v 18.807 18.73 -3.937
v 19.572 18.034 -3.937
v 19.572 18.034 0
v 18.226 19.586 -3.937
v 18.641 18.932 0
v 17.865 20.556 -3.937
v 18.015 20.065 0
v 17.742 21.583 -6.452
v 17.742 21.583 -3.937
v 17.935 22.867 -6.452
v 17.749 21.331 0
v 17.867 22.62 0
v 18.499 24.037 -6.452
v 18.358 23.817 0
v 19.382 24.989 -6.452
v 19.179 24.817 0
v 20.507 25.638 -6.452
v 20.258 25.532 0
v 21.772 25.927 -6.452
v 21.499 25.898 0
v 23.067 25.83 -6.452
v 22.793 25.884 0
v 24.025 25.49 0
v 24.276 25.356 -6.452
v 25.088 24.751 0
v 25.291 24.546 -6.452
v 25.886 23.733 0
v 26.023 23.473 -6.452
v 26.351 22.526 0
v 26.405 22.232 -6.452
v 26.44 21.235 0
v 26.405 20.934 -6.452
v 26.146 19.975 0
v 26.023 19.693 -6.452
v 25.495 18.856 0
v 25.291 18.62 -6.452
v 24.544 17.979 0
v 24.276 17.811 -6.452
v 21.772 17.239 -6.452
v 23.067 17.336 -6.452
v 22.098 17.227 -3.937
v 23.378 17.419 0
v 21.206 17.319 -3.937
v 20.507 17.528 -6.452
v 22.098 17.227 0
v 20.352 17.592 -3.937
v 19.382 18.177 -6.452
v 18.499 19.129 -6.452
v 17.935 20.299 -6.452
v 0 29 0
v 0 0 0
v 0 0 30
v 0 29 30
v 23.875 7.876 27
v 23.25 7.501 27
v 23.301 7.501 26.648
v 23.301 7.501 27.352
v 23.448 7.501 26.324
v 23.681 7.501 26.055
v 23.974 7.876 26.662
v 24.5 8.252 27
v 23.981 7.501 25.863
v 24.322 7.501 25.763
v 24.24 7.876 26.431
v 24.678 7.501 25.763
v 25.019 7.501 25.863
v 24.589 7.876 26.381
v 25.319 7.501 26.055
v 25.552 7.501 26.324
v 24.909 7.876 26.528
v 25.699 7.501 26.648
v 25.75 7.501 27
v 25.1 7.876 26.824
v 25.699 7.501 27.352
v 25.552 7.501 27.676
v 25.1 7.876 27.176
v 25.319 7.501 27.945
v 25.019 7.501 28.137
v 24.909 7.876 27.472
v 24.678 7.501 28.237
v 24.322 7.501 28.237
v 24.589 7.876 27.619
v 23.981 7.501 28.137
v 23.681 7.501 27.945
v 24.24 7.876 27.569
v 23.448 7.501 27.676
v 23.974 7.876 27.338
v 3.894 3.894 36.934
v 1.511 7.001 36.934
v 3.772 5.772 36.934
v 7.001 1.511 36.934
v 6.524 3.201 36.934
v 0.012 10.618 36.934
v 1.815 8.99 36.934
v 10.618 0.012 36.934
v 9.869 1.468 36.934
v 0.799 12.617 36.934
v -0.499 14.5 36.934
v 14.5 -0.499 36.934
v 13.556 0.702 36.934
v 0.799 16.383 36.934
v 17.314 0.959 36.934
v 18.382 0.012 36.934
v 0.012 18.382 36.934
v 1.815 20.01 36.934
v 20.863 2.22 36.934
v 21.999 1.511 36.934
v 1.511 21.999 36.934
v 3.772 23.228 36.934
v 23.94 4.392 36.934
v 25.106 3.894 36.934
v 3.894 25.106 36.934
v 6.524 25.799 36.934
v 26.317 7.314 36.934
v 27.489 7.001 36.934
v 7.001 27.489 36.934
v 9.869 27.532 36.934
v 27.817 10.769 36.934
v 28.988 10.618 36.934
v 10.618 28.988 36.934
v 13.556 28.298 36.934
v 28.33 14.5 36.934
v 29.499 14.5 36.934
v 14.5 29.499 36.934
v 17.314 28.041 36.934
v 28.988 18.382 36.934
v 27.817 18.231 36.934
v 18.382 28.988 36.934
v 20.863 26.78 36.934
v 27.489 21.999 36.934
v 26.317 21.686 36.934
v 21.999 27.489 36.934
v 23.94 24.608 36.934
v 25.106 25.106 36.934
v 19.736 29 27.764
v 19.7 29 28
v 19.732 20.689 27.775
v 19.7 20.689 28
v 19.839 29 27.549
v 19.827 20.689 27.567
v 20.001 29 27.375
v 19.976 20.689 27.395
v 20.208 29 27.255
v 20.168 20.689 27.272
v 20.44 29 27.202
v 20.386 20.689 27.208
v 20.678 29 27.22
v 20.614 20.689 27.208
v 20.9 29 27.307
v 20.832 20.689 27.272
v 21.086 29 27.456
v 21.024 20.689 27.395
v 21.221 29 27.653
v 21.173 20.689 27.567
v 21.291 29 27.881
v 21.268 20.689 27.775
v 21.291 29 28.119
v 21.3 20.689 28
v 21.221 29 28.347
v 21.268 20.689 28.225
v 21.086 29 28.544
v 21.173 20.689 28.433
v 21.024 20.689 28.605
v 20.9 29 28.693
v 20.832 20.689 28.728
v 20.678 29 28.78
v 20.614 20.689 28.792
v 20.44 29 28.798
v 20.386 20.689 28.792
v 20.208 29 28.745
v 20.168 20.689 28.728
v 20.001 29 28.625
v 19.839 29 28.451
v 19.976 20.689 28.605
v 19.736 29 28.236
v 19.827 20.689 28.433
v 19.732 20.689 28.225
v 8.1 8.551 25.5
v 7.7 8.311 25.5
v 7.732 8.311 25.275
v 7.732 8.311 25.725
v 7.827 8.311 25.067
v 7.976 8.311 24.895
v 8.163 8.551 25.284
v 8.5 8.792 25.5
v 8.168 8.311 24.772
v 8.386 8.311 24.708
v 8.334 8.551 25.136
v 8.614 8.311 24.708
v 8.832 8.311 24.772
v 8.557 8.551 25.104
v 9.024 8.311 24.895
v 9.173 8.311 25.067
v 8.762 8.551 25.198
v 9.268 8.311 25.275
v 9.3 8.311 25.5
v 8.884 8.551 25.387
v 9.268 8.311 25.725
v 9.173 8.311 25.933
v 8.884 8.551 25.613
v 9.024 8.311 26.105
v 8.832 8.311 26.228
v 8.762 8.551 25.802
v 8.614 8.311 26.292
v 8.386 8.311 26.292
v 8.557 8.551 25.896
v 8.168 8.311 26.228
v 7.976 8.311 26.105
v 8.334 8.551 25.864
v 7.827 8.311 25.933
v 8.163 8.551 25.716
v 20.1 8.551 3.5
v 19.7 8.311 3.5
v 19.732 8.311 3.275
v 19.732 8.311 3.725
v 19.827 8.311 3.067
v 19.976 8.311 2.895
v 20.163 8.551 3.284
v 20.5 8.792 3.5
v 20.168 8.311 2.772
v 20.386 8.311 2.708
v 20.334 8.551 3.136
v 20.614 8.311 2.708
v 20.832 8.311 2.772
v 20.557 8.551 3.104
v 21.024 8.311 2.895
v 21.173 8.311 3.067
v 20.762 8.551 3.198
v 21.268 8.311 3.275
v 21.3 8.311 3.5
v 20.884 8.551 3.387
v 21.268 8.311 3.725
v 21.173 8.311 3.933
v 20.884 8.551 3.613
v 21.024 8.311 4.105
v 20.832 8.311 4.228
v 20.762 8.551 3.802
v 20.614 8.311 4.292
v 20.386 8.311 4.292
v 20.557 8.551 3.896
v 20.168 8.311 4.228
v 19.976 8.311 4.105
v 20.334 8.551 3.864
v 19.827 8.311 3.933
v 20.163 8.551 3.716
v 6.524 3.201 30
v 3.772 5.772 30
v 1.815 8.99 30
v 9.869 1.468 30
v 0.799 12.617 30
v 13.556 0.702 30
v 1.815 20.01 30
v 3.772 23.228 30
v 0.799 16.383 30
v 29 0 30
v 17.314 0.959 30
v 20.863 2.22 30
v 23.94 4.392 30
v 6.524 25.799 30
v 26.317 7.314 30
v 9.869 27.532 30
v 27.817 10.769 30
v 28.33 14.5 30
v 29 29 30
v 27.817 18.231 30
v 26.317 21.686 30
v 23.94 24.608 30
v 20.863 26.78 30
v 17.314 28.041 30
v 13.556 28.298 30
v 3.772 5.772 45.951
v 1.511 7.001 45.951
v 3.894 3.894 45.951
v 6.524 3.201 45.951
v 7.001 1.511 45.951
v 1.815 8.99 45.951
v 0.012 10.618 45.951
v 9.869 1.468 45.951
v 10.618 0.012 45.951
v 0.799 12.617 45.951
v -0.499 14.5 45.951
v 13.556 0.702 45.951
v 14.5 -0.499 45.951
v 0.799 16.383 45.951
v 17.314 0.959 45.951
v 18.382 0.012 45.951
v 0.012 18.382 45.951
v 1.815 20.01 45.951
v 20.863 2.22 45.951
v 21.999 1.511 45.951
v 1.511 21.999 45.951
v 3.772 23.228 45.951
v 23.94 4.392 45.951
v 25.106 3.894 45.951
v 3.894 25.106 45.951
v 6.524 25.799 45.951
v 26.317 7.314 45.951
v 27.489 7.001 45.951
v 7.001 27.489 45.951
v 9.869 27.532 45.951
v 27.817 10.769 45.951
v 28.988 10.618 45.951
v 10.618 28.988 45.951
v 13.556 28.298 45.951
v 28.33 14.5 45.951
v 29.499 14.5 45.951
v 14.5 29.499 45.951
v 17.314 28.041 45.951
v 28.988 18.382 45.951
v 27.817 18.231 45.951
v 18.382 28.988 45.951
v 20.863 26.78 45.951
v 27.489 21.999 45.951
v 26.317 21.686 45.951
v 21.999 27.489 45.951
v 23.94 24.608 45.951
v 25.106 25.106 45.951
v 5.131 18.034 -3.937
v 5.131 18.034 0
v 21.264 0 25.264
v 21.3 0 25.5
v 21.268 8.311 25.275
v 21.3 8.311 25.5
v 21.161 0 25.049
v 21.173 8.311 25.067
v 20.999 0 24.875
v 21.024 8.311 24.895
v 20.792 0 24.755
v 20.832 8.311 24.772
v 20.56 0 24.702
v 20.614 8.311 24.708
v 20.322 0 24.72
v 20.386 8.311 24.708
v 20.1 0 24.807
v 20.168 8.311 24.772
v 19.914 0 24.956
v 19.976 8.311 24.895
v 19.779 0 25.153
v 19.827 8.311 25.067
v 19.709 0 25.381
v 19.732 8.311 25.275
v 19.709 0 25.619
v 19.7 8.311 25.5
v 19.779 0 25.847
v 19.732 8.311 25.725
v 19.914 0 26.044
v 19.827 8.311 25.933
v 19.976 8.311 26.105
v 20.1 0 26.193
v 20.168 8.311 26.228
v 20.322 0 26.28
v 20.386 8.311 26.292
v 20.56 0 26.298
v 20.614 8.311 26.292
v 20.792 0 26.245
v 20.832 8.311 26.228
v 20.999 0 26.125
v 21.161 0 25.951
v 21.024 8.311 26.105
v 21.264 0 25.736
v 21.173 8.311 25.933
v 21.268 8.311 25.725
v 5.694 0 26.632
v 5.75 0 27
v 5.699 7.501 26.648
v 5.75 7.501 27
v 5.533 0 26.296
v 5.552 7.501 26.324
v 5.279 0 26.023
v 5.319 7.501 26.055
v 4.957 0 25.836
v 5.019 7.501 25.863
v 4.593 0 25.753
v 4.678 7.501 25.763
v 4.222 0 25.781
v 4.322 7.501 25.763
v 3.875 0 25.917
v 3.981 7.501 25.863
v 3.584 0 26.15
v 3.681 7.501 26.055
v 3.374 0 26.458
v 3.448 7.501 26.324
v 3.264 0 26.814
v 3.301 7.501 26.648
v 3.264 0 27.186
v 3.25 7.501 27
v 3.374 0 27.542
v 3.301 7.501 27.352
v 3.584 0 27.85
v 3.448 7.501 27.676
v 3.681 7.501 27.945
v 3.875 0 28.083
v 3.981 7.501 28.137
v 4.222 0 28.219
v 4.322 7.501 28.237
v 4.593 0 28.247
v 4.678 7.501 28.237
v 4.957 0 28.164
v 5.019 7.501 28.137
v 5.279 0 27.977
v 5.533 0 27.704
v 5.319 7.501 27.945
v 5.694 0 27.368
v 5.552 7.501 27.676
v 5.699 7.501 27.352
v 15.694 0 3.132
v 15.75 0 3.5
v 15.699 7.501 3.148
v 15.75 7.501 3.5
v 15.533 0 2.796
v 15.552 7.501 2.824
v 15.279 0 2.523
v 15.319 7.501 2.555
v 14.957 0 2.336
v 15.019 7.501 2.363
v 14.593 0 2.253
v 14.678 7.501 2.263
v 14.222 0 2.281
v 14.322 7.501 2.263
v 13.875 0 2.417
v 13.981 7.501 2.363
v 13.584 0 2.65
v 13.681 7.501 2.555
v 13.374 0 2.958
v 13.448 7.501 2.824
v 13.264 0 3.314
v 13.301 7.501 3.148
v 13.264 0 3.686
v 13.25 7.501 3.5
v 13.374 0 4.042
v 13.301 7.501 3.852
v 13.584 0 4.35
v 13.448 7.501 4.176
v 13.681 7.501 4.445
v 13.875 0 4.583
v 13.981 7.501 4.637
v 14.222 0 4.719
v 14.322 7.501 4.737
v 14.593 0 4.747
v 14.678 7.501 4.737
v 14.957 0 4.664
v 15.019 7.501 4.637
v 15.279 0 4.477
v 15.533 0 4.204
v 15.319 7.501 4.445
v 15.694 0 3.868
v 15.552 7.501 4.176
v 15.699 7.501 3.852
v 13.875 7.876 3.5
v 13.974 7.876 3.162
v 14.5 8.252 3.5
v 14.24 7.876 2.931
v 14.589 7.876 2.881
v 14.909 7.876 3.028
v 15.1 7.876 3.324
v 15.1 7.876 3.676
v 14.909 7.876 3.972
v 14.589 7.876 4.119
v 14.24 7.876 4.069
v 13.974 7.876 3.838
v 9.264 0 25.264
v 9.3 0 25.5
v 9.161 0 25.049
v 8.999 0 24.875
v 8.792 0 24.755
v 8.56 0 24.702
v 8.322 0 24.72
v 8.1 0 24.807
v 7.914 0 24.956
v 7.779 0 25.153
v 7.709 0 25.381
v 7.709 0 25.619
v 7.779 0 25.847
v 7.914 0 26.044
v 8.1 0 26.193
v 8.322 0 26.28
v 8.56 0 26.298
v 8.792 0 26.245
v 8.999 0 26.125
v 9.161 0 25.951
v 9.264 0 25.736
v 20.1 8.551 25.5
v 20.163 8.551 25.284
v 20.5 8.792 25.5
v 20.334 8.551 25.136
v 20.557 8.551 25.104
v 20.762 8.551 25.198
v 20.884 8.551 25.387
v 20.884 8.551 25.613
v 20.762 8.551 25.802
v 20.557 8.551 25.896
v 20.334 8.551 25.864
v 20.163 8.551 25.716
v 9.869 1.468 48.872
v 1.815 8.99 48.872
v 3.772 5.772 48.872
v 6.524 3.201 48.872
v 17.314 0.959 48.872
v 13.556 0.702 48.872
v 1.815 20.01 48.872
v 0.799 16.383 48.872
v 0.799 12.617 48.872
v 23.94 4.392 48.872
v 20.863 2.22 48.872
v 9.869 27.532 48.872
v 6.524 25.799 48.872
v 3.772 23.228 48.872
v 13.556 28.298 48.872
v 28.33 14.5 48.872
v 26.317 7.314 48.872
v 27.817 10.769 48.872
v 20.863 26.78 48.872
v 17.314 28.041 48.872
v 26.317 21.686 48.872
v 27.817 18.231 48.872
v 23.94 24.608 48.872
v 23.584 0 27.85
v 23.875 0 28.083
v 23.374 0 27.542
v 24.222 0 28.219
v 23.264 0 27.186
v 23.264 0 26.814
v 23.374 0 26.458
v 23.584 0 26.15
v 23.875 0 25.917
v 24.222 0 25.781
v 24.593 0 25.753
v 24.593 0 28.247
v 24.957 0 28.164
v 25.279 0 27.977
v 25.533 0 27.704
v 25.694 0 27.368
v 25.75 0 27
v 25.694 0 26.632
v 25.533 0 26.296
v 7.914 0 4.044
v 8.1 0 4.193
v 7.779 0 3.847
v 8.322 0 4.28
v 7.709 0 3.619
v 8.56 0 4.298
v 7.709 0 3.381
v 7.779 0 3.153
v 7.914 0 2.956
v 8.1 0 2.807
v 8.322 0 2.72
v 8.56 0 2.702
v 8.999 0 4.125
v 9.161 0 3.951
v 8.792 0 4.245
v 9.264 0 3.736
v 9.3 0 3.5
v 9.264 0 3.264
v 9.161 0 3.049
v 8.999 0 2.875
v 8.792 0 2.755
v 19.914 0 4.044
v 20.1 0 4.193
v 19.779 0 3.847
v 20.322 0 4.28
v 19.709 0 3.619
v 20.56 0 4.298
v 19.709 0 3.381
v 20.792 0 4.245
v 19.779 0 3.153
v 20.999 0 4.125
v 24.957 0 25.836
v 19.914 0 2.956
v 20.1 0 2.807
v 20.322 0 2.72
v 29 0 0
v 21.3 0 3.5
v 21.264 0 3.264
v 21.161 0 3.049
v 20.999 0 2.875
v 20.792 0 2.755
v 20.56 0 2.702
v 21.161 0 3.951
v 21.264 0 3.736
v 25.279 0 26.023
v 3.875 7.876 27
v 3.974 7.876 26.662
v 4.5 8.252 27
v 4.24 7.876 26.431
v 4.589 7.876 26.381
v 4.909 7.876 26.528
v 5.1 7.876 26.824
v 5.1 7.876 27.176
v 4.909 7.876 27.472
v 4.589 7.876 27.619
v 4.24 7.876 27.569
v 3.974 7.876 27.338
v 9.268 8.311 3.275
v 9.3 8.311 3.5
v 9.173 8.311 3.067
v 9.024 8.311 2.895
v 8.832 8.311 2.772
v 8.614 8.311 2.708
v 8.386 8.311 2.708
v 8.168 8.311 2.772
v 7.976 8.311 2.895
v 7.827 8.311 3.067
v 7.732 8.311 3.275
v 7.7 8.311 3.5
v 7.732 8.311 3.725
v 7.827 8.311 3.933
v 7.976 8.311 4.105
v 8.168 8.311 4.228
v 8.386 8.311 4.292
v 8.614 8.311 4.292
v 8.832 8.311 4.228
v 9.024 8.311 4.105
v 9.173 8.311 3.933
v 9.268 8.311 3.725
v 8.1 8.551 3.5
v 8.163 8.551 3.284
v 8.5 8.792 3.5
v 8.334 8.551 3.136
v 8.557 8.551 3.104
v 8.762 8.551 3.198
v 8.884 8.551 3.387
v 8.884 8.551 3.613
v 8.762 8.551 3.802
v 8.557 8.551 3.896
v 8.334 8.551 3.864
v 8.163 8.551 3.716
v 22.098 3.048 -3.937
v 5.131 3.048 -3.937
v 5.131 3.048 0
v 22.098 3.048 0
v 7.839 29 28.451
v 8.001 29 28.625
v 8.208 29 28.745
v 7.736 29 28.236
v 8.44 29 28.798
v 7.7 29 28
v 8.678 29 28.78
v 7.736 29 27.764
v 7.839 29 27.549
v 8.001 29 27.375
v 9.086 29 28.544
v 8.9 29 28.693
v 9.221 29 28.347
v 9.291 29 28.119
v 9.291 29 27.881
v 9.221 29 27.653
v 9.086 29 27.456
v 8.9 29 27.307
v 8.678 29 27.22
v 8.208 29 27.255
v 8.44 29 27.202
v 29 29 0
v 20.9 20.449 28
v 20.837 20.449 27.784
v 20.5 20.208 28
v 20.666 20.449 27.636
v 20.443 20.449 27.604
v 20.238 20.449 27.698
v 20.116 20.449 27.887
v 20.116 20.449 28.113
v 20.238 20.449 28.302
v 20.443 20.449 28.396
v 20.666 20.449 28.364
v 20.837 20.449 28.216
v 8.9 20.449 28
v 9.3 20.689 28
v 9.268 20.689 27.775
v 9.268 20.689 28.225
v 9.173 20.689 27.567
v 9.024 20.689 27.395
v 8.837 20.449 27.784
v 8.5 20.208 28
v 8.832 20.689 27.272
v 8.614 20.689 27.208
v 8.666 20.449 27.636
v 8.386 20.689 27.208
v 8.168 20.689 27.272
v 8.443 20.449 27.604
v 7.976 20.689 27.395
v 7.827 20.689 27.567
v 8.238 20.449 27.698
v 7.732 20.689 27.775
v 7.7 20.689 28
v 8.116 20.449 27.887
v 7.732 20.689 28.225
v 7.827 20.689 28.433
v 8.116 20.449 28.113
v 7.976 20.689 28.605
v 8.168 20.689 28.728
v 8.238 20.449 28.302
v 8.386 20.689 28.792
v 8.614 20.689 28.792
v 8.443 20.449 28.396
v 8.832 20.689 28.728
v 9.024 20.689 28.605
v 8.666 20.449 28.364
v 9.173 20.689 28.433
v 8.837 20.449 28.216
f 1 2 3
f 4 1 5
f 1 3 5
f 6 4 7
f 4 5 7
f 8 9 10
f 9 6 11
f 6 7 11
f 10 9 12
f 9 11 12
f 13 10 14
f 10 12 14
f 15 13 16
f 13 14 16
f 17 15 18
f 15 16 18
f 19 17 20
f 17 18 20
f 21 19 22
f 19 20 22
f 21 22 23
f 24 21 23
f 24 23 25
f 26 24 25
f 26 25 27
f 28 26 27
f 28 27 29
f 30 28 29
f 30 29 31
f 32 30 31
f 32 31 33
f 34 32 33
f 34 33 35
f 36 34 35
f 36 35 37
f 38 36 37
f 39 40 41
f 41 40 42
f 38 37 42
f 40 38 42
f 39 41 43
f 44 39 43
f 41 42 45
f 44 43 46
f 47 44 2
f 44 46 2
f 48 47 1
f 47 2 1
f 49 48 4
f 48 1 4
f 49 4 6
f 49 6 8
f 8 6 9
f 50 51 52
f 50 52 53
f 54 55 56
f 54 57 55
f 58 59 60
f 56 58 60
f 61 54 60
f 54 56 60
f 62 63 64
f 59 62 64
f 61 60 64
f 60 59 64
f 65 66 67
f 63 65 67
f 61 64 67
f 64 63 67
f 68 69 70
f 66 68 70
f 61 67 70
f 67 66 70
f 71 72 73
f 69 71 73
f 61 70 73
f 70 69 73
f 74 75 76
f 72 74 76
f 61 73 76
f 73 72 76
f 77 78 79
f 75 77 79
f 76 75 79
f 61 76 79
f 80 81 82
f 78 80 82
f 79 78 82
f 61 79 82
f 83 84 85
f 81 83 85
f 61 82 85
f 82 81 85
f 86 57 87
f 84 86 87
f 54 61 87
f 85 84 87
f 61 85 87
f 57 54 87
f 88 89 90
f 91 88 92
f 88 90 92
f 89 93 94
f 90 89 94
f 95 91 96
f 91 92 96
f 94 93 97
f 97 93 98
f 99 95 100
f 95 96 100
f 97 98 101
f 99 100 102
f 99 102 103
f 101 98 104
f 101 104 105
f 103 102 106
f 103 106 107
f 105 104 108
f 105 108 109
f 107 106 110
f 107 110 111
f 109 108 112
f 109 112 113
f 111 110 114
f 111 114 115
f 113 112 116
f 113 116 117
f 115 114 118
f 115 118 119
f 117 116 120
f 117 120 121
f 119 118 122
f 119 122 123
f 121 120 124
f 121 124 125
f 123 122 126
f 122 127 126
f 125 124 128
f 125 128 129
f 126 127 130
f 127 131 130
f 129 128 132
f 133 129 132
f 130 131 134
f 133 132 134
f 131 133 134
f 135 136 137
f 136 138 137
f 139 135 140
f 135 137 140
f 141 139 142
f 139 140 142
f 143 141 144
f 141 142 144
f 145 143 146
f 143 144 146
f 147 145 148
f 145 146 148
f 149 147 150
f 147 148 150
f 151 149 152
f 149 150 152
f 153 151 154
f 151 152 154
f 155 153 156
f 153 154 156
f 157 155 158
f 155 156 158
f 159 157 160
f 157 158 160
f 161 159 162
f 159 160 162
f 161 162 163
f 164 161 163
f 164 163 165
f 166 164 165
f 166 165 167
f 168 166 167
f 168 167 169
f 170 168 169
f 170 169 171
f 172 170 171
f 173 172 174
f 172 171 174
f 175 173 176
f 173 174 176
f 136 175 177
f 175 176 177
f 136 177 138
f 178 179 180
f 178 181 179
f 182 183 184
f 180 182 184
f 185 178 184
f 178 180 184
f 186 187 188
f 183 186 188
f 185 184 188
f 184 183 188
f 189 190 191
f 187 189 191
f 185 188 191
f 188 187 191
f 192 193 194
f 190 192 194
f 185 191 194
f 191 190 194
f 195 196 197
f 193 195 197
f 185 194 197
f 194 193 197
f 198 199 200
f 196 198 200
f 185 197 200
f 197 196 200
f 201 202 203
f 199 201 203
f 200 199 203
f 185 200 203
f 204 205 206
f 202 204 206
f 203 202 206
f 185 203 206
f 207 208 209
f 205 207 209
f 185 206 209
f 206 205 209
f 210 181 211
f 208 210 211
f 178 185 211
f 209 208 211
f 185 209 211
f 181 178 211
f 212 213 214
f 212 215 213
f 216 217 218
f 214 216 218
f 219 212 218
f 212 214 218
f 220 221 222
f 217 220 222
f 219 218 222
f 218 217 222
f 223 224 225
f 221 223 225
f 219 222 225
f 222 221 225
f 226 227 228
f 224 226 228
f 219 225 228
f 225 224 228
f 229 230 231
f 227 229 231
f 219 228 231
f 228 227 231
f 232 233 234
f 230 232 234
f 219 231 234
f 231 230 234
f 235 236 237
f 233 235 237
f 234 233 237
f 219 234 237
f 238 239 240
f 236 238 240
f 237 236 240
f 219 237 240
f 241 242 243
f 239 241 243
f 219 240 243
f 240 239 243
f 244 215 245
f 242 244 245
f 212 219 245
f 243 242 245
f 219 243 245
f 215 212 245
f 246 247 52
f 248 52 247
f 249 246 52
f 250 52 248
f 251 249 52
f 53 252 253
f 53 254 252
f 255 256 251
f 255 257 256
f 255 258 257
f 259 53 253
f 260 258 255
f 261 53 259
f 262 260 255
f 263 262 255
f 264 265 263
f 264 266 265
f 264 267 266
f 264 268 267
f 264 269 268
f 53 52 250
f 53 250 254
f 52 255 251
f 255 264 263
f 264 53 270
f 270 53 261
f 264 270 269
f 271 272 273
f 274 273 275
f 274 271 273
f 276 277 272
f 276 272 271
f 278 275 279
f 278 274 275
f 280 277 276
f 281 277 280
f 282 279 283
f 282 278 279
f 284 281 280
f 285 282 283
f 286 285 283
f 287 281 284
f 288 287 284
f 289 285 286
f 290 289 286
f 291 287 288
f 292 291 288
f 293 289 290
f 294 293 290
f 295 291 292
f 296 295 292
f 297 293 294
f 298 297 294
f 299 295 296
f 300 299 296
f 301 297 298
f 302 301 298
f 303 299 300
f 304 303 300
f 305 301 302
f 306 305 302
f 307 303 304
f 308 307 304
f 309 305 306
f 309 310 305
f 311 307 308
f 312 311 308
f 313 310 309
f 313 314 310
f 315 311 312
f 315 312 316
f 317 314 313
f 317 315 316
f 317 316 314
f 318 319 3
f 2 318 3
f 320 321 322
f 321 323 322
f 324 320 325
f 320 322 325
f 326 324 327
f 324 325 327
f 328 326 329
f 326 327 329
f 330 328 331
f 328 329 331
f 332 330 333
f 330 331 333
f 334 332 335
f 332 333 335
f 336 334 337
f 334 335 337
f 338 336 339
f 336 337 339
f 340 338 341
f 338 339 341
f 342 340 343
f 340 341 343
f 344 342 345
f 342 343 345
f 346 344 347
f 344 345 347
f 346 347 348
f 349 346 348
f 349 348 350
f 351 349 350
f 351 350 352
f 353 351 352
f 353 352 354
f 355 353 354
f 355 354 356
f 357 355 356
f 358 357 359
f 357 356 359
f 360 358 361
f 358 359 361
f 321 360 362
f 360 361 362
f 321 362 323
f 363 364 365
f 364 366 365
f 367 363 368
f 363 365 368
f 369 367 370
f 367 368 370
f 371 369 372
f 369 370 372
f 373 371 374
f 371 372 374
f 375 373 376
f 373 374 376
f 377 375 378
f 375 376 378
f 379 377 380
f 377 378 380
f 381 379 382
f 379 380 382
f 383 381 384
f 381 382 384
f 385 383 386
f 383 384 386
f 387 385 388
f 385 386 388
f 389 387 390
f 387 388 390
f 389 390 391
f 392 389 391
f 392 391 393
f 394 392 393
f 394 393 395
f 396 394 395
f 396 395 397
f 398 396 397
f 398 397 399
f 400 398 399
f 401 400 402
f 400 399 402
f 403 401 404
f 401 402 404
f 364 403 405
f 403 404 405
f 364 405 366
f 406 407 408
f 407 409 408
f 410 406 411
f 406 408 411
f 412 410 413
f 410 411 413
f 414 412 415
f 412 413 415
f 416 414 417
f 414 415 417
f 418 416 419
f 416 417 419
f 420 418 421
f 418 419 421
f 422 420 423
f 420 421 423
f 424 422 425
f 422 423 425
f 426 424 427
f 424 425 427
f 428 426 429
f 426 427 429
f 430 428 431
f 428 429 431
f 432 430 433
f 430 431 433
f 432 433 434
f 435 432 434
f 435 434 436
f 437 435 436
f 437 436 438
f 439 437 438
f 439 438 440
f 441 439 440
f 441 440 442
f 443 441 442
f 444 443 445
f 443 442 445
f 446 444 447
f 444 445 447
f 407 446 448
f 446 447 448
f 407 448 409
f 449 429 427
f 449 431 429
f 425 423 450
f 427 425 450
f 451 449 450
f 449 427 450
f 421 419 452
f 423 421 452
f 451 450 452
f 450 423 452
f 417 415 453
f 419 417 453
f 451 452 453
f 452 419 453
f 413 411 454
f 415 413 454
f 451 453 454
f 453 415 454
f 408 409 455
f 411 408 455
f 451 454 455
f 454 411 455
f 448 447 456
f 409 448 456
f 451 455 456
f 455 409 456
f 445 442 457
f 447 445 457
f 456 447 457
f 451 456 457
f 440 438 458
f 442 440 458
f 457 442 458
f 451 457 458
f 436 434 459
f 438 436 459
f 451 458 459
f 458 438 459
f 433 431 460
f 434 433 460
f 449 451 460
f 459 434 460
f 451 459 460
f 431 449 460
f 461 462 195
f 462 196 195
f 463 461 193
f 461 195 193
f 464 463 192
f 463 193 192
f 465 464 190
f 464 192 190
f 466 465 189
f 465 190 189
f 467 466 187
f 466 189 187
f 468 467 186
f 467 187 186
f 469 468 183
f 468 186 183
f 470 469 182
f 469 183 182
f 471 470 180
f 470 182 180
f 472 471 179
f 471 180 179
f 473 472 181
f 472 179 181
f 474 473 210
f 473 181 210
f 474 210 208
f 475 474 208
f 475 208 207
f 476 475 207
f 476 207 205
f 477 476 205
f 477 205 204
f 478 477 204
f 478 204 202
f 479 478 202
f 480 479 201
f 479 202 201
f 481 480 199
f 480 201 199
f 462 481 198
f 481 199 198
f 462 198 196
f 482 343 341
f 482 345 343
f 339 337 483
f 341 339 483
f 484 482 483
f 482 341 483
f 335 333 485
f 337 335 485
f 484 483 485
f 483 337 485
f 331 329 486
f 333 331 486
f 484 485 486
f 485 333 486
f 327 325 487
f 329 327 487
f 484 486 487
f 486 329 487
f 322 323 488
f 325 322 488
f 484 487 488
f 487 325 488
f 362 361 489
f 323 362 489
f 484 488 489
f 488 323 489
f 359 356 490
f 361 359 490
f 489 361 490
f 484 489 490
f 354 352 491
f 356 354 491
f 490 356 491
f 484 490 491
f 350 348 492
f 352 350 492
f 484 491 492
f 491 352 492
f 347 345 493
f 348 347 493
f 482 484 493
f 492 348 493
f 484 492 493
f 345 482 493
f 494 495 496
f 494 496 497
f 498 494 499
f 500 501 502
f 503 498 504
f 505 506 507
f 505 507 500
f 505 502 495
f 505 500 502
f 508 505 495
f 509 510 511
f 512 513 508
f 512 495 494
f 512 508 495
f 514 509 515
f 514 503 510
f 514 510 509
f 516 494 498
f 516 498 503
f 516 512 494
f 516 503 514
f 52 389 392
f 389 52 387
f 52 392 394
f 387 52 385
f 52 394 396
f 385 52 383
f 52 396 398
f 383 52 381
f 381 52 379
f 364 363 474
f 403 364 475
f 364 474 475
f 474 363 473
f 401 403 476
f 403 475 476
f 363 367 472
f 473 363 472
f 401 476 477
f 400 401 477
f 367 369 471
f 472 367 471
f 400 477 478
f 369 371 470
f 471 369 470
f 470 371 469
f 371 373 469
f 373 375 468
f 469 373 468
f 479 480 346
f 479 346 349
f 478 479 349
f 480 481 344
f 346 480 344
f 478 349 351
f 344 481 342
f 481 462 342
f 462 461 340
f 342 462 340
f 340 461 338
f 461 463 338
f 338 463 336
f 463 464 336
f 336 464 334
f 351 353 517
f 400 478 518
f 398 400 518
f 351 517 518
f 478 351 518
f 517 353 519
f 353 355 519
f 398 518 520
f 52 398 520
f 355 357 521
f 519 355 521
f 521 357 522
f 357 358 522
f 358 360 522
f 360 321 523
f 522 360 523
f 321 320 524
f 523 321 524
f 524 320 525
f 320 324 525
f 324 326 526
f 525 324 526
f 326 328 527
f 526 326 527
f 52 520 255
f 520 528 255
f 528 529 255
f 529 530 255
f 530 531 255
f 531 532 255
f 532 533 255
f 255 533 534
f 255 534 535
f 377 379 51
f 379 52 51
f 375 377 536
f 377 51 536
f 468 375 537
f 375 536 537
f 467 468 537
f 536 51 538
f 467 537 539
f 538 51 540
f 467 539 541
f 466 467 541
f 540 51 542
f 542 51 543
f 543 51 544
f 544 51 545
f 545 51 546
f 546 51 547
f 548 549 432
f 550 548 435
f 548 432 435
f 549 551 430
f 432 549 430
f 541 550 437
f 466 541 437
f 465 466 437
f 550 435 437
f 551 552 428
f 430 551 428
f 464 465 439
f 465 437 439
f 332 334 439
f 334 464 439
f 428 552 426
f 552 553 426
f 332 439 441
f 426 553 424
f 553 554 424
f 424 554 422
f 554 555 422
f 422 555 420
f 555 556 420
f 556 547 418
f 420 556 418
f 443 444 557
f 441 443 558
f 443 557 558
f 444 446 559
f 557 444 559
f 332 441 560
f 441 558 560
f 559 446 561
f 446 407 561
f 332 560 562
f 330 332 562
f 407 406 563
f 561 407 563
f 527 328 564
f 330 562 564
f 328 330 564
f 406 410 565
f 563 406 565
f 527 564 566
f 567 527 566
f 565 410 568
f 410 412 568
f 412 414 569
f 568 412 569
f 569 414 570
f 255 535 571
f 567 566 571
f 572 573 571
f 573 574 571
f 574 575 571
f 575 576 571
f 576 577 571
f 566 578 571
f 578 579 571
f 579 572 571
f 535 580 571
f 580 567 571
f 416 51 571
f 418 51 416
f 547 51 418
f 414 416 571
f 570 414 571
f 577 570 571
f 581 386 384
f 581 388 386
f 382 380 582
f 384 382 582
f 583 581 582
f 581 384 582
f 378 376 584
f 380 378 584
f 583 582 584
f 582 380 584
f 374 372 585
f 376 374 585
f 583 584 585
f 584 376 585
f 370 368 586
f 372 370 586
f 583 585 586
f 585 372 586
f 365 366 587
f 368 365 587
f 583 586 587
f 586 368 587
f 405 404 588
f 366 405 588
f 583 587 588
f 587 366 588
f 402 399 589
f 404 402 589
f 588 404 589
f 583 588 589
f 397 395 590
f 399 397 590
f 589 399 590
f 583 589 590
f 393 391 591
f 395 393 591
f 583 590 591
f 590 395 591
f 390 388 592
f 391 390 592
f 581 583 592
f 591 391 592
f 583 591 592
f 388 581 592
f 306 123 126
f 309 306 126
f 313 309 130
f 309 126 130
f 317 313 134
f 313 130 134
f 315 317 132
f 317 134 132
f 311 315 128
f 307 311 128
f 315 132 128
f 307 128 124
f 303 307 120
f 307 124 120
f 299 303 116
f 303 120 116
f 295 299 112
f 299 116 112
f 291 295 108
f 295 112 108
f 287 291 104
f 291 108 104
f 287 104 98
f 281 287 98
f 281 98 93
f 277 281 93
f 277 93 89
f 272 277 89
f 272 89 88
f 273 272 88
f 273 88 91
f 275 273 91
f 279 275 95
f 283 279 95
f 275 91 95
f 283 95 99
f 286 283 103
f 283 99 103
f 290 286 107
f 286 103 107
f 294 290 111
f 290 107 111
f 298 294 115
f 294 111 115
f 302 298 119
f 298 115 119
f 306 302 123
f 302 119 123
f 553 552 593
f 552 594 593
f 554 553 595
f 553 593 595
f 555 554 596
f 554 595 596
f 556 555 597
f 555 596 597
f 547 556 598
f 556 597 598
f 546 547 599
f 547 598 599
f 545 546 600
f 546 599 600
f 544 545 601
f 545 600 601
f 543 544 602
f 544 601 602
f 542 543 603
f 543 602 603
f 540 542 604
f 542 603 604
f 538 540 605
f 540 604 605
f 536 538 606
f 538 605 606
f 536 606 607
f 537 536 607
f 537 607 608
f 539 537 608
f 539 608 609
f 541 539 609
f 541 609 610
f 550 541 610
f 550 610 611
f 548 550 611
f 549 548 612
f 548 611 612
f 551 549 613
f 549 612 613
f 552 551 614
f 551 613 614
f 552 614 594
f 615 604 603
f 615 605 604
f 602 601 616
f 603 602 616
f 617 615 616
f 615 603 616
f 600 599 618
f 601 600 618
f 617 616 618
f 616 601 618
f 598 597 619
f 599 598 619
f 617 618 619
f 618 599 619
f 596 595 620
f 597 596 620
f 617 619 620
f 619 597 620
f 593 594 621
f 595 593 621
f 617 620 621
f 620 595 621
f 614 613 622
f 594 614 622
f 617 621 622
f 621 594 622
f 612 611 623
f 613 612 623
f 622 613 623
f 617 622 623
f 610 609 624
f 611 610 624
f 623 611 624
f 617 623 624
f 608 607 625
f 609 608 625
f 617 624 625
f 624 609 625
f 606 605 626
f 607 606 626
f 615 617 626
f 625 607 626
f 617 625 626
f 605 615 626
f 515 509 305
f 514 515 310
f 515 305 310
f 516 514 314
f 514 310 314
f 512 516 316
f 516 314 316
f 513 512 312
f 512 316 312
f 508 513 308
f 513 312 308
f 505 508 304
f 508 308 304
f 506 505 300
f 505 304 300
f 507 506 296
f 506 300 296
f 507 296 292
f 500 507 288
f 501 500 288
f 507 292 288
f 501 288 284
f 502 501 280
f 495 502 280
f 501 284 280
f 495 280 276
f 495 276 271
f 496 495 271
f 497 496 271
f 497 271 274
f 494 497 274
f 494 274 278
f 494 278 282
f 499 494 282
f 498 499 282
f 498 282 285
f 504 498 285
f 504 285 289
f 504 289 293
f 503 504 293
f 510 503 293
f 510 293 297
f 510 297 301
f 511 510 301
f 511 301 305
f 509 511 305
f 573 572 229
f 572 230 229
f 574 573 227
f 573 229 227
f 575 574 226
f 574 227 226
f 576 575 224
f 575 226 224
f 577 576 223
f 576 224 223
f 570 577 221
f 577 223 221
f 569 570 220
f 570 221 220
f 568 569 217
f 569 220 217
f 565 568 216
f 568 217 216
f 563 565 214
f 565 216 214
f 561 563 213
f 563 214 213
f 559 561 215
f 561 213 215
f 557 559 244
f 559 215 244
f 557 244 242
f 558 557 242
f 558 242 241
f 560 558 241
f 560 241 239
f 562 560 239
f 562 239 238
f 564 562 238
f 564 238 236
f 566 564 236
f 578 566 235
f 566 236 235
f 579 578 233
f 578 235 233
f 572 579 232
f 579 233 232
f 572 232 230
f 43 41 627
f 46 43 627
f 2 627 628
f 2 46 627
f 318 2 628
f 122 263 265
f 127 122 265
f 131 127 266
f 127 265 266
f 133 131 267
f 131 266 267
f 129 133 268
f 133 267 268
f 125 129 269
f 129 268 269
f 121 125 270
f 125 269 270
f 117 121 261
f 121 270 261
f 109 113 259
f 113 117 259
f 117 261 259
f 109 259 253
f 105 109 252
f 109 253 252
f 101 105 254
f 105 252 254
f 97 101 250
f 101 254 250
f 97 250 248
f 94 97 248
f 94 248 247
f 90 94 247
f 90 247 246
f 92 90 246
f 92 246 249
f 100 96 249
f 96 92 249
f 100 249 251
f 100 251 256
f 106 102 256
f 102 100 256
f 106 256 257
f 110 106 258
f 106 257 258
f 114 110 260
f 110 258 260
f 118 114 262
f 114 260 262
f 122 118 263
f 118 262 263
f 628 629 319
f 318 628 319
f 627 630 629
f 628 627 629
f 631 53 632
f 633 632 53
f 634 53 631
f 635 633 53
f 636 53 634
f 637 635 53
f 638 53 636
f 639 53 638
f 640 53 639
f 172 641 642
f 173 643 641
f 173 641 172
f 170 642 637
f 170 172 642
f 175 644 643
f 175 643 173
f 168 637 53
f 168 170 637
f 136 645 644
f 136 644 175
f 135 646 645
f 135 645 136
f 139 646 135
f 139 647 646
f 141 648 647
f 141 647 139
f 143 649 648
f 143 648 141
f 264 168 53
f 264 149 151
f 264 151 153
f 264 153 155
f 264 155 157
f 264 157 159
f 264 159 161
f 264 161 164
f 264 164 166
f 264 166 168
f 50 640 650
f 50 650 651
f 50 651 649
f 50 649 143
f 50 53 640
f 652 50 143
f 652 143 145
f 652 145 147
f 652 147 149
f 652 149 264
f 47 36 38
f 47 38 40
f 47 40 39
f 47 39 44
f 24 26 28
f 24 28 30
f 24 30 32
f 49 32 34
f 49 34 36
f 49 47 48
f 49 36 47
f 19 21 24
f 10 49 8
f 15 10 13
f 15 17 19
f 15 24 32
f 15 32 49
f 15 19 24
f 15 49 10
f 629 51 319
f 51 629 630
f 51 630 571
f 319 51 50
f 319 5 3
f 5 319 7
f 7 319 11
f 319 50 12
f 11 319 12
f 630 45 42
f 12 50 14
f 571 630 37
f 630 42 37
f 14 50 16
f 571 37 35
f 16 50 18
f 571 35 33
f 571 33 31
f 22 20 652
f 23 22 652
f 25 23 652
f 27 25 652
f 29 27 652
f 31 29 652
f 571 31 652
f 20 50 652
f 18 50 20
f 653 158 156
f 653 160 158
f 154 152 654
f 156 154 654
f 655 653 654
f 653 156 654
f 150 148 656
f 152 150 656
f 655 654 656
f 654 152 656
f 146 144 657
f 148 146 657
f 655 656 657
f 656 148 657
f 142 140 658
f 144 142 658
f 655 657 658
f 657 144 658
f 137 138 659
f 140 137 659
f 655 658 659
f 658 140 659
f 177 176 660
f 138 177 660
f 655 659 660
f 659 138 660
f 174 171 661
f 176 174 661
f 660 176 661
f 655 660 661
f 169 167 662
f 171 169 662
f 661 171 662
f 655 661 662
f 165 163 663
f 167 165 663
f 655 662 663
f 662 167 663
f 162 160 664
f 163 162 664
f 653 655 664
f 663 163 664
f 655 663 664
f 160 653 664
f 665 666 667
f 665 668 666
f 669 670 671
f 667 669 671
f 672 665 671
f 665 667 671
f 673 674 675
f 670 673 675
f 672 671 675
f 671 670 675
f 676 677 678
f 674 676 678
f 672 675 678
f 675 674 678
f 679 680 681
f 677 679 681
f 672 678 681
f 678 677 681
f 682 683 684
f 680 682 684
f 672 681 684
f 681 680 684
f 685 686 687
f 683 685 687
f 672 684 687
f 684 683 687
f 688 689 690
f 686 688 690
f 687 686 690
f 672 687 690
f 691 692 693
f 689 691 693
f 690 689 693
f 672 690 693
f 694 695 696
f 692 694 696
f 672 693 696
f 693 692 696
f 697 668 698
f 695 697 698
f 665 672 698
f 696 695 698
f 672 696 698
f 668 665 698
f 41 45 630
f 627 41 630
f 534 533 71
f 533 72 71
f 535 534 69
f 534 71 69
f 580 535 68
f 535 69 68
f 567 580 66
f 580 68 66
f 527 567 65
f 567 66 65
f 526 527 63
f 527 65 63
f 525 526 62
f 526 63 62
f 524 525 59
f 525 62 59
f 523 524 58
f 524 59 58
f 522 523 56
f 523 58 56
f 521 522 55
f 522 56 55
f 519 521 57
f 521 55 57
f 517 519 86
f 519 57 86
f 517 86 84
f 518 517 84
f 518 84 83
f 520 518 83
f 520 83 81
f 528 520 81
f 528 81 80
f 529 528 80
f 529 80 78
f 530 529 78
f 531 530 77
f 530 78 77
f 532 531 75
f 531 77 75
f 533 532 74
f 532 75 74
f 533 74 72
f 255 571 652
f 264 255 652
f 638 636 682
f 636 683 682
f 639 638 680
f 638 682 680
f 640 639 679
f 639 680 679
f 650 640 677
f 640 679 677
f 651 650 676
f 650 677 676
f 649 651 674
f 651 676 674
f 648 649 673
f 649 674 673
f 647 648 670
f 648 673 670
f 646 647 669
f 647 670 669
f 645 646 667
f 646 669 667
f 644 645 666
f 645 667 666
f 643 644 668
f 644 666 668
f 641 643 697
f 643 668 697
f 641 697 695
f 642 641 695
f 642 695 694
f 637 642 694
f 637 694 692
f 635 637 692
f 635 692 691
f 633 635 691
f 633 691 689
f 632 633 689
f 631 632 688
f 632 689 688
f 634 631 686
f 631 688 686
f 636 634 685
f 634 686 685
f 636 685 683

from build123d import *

# Parameters (mm, degrees)
SKETCH1_W                 = 29
SKETCH1_H                 = 29
BOSS_EXTRUDE1_DEPTH       = 30
SKETCH2_R                 = 13.8303
BOSS_EXTRUDE2_DEPTH       = 18.8722
M2X0_4_TAPPED_HOLE1_D     = 1.6
M2X0_4_TAPPED_HOLE1_DEPTH = 8.31088
M2X0_4_TAPPED_HOLE1_TIP   = 0.480688495
M2X0_4_TAPPED_HOLE2_D     = 1.6
M2X0_4_TAPPED_HOLE2_DEPTH = 8.31088
M2X0_4_TAPPED_HOLE2_TIP   = 0.480688495
M3X0_5_TAPPED_HOLE1_D     = 2.5
M3X0_5_TAPPED_HOLE1_DEPTH = 7.50062
M3X0_5_TAPPED_HOLE1_TIP   = 0.751075774
BOSS_EXTRUDE4_DEPTH       = 3.937
SKETCH15_7_R              = 4.3561
BOSS_EXTRUDE5_DEPTH       = 6.4516
BOSS_EXTRUDE6_START       = 6.9342
SKETCH2_5_R               = 14.9987
BOSS_EXTRUDE6_DEPTH       = 9.017


with BuildPart() as part:
    # Sketch1 → Boss-Extrude1 (new body)
    with BuildSketch(Plane.XY):
        with Locations((14.5, 14.5)):
            Rectangle(SKETCH1_W, SKETCH1_H)
    extrude(amount=BOSS_EXTRUDE1_DEPTH)

    # Sketch2 → Boss-Extrude2 (add)
    with BuildSketch(Plane.XY.offset(30)):
        with Locations((14.5, 14.5)):
            Circle(SKETCH2_R)
    extrude(amount=BOSS_EXTRUDE2_DEPTH)

    # M2x0.4 Tapped Hole1
    with Locations(Plane(origin=(0, 0, 0), x_dir=(-1, 0, 0), z_dir=(0, -1, 0))):
        with Locations((-20.5, -3.5), (-20.5, -25.5), (-8.5, -3.5), (-8.5, -25.5)):
            Hole(M2X0_4_TAPPED_HOLE1_D / 2, depth=M2X0_4_TAPPED_HOLE1_DEPTH)
            with Locations((0, 0, -(M2X0_4_TAPPED_HOLE1_DEPTH + M2X0_4_TAPPED_HOLE1_TIP / 2))):  # 118° drill point
                Cone(0, M2X0_4_TAPPED_HOLE1_D / 2, M2X0_4_TAPPED_HOLE1_TIP, mode=Mode.SUBTRACT)

    # M2x0.4 Tapped Hole2
    with Locations(Plane(origin=(0, 29, 0), x_dir=(1, 0, 0), z_dir=(0, 1, 0))):
        with Locations((20.5, -28), (8.5, -28)):
            Hole(M2X0_4_TAPPED_HOLE2_D / 2, depth=M2X0_4_TAPPED_HOLE2_DEPTH)
            with Locations((0, 0, -(M2X0_4_TAPPED_HOLE2_DEPTH + M2X0_4_TAPPED_HOLE2_TIP / 2))):  # 118° drill point
                Cone(0, M2X0_4_TAPPED_HOLE2_D / 2, M2X0_4_TAPPED_HOLE2_TIP, mode=Mode.SUBTRACT)

    # M3x0.5 Tapped Hole1
    with Locations(Plane(origin=(0, 0, 0), x_dir=(-1, 0, 0), z_dir=(0, -1, 0))):
        with Locations((-14.5, -3.5), (-4.5, -27), (-24.5, -27)):
            Hole(M3X0_5_TAPPED_HOLE1_D / 2, depth=M3X0_5_TAPPED_HOLE1_DEPTH)
            with Locations((0, 0, -(M3X0_5_TAPPED_HOLE1_DEPTH + M3X0_5_TAPPED_HOLE1_TIP / 2))):  # 118° drill point
                Cone(0, M3X0_5_TAPPED_HOLE1_D / 2, M3X0_5_TAPPED_HOLE1_TIP, mode=Mode.SUBTRACT)

    # Sketch15 → Boss-Extrude4 (add)
    with BuildSketch(Plane(origin=(0, 0, 0), x_dir=(-1, 0, 0), z_dir=(0, 0, -1))):
        with BuildLine():
            Line((-5.1308, 18.034), (-19.572374024, 18.034))
            ThreePointArc((-19.572374024, 18.034), (-23.423695495, 25.732674505), (-22.098, 17.2271))
            Line((-22.098, 17.2271), (-22.098, 3.048))
            Line((-22.098, 3.048), (-5.1308, 3.048))
            Line((-5.1308, 3.048), (-5.1308, 18.034))
        make_face()
    extrude(amount=BOSS_EXTRUDE4_DEPTH)

    # Sketch15<7> → Boss-Extrude5 (add)
    with BuildSketch(Plane(origin=(0, 0, 0), x_dir=(-1, 0, 0), z_dir=(0, 0, -1))):
        with Locations((-22.098, 21.5832)):
            Circle(SKETCH15_7_R)
    extrude(amount=BOSS_EXTRUDE5_DEPTH)

    # Sketch2<5> → Boss-Extrude6 (add)
    with BuildSketch(Plane.XY.offset(30).offset(BOSS_EXTRUDE6_START)):
        with Locations((14.5, 14.5)):
            Circle(SKETCH2_5_R)
    extrude(amount=BOSS_EXTRUDE6_DEPTH)


solid = part.part
